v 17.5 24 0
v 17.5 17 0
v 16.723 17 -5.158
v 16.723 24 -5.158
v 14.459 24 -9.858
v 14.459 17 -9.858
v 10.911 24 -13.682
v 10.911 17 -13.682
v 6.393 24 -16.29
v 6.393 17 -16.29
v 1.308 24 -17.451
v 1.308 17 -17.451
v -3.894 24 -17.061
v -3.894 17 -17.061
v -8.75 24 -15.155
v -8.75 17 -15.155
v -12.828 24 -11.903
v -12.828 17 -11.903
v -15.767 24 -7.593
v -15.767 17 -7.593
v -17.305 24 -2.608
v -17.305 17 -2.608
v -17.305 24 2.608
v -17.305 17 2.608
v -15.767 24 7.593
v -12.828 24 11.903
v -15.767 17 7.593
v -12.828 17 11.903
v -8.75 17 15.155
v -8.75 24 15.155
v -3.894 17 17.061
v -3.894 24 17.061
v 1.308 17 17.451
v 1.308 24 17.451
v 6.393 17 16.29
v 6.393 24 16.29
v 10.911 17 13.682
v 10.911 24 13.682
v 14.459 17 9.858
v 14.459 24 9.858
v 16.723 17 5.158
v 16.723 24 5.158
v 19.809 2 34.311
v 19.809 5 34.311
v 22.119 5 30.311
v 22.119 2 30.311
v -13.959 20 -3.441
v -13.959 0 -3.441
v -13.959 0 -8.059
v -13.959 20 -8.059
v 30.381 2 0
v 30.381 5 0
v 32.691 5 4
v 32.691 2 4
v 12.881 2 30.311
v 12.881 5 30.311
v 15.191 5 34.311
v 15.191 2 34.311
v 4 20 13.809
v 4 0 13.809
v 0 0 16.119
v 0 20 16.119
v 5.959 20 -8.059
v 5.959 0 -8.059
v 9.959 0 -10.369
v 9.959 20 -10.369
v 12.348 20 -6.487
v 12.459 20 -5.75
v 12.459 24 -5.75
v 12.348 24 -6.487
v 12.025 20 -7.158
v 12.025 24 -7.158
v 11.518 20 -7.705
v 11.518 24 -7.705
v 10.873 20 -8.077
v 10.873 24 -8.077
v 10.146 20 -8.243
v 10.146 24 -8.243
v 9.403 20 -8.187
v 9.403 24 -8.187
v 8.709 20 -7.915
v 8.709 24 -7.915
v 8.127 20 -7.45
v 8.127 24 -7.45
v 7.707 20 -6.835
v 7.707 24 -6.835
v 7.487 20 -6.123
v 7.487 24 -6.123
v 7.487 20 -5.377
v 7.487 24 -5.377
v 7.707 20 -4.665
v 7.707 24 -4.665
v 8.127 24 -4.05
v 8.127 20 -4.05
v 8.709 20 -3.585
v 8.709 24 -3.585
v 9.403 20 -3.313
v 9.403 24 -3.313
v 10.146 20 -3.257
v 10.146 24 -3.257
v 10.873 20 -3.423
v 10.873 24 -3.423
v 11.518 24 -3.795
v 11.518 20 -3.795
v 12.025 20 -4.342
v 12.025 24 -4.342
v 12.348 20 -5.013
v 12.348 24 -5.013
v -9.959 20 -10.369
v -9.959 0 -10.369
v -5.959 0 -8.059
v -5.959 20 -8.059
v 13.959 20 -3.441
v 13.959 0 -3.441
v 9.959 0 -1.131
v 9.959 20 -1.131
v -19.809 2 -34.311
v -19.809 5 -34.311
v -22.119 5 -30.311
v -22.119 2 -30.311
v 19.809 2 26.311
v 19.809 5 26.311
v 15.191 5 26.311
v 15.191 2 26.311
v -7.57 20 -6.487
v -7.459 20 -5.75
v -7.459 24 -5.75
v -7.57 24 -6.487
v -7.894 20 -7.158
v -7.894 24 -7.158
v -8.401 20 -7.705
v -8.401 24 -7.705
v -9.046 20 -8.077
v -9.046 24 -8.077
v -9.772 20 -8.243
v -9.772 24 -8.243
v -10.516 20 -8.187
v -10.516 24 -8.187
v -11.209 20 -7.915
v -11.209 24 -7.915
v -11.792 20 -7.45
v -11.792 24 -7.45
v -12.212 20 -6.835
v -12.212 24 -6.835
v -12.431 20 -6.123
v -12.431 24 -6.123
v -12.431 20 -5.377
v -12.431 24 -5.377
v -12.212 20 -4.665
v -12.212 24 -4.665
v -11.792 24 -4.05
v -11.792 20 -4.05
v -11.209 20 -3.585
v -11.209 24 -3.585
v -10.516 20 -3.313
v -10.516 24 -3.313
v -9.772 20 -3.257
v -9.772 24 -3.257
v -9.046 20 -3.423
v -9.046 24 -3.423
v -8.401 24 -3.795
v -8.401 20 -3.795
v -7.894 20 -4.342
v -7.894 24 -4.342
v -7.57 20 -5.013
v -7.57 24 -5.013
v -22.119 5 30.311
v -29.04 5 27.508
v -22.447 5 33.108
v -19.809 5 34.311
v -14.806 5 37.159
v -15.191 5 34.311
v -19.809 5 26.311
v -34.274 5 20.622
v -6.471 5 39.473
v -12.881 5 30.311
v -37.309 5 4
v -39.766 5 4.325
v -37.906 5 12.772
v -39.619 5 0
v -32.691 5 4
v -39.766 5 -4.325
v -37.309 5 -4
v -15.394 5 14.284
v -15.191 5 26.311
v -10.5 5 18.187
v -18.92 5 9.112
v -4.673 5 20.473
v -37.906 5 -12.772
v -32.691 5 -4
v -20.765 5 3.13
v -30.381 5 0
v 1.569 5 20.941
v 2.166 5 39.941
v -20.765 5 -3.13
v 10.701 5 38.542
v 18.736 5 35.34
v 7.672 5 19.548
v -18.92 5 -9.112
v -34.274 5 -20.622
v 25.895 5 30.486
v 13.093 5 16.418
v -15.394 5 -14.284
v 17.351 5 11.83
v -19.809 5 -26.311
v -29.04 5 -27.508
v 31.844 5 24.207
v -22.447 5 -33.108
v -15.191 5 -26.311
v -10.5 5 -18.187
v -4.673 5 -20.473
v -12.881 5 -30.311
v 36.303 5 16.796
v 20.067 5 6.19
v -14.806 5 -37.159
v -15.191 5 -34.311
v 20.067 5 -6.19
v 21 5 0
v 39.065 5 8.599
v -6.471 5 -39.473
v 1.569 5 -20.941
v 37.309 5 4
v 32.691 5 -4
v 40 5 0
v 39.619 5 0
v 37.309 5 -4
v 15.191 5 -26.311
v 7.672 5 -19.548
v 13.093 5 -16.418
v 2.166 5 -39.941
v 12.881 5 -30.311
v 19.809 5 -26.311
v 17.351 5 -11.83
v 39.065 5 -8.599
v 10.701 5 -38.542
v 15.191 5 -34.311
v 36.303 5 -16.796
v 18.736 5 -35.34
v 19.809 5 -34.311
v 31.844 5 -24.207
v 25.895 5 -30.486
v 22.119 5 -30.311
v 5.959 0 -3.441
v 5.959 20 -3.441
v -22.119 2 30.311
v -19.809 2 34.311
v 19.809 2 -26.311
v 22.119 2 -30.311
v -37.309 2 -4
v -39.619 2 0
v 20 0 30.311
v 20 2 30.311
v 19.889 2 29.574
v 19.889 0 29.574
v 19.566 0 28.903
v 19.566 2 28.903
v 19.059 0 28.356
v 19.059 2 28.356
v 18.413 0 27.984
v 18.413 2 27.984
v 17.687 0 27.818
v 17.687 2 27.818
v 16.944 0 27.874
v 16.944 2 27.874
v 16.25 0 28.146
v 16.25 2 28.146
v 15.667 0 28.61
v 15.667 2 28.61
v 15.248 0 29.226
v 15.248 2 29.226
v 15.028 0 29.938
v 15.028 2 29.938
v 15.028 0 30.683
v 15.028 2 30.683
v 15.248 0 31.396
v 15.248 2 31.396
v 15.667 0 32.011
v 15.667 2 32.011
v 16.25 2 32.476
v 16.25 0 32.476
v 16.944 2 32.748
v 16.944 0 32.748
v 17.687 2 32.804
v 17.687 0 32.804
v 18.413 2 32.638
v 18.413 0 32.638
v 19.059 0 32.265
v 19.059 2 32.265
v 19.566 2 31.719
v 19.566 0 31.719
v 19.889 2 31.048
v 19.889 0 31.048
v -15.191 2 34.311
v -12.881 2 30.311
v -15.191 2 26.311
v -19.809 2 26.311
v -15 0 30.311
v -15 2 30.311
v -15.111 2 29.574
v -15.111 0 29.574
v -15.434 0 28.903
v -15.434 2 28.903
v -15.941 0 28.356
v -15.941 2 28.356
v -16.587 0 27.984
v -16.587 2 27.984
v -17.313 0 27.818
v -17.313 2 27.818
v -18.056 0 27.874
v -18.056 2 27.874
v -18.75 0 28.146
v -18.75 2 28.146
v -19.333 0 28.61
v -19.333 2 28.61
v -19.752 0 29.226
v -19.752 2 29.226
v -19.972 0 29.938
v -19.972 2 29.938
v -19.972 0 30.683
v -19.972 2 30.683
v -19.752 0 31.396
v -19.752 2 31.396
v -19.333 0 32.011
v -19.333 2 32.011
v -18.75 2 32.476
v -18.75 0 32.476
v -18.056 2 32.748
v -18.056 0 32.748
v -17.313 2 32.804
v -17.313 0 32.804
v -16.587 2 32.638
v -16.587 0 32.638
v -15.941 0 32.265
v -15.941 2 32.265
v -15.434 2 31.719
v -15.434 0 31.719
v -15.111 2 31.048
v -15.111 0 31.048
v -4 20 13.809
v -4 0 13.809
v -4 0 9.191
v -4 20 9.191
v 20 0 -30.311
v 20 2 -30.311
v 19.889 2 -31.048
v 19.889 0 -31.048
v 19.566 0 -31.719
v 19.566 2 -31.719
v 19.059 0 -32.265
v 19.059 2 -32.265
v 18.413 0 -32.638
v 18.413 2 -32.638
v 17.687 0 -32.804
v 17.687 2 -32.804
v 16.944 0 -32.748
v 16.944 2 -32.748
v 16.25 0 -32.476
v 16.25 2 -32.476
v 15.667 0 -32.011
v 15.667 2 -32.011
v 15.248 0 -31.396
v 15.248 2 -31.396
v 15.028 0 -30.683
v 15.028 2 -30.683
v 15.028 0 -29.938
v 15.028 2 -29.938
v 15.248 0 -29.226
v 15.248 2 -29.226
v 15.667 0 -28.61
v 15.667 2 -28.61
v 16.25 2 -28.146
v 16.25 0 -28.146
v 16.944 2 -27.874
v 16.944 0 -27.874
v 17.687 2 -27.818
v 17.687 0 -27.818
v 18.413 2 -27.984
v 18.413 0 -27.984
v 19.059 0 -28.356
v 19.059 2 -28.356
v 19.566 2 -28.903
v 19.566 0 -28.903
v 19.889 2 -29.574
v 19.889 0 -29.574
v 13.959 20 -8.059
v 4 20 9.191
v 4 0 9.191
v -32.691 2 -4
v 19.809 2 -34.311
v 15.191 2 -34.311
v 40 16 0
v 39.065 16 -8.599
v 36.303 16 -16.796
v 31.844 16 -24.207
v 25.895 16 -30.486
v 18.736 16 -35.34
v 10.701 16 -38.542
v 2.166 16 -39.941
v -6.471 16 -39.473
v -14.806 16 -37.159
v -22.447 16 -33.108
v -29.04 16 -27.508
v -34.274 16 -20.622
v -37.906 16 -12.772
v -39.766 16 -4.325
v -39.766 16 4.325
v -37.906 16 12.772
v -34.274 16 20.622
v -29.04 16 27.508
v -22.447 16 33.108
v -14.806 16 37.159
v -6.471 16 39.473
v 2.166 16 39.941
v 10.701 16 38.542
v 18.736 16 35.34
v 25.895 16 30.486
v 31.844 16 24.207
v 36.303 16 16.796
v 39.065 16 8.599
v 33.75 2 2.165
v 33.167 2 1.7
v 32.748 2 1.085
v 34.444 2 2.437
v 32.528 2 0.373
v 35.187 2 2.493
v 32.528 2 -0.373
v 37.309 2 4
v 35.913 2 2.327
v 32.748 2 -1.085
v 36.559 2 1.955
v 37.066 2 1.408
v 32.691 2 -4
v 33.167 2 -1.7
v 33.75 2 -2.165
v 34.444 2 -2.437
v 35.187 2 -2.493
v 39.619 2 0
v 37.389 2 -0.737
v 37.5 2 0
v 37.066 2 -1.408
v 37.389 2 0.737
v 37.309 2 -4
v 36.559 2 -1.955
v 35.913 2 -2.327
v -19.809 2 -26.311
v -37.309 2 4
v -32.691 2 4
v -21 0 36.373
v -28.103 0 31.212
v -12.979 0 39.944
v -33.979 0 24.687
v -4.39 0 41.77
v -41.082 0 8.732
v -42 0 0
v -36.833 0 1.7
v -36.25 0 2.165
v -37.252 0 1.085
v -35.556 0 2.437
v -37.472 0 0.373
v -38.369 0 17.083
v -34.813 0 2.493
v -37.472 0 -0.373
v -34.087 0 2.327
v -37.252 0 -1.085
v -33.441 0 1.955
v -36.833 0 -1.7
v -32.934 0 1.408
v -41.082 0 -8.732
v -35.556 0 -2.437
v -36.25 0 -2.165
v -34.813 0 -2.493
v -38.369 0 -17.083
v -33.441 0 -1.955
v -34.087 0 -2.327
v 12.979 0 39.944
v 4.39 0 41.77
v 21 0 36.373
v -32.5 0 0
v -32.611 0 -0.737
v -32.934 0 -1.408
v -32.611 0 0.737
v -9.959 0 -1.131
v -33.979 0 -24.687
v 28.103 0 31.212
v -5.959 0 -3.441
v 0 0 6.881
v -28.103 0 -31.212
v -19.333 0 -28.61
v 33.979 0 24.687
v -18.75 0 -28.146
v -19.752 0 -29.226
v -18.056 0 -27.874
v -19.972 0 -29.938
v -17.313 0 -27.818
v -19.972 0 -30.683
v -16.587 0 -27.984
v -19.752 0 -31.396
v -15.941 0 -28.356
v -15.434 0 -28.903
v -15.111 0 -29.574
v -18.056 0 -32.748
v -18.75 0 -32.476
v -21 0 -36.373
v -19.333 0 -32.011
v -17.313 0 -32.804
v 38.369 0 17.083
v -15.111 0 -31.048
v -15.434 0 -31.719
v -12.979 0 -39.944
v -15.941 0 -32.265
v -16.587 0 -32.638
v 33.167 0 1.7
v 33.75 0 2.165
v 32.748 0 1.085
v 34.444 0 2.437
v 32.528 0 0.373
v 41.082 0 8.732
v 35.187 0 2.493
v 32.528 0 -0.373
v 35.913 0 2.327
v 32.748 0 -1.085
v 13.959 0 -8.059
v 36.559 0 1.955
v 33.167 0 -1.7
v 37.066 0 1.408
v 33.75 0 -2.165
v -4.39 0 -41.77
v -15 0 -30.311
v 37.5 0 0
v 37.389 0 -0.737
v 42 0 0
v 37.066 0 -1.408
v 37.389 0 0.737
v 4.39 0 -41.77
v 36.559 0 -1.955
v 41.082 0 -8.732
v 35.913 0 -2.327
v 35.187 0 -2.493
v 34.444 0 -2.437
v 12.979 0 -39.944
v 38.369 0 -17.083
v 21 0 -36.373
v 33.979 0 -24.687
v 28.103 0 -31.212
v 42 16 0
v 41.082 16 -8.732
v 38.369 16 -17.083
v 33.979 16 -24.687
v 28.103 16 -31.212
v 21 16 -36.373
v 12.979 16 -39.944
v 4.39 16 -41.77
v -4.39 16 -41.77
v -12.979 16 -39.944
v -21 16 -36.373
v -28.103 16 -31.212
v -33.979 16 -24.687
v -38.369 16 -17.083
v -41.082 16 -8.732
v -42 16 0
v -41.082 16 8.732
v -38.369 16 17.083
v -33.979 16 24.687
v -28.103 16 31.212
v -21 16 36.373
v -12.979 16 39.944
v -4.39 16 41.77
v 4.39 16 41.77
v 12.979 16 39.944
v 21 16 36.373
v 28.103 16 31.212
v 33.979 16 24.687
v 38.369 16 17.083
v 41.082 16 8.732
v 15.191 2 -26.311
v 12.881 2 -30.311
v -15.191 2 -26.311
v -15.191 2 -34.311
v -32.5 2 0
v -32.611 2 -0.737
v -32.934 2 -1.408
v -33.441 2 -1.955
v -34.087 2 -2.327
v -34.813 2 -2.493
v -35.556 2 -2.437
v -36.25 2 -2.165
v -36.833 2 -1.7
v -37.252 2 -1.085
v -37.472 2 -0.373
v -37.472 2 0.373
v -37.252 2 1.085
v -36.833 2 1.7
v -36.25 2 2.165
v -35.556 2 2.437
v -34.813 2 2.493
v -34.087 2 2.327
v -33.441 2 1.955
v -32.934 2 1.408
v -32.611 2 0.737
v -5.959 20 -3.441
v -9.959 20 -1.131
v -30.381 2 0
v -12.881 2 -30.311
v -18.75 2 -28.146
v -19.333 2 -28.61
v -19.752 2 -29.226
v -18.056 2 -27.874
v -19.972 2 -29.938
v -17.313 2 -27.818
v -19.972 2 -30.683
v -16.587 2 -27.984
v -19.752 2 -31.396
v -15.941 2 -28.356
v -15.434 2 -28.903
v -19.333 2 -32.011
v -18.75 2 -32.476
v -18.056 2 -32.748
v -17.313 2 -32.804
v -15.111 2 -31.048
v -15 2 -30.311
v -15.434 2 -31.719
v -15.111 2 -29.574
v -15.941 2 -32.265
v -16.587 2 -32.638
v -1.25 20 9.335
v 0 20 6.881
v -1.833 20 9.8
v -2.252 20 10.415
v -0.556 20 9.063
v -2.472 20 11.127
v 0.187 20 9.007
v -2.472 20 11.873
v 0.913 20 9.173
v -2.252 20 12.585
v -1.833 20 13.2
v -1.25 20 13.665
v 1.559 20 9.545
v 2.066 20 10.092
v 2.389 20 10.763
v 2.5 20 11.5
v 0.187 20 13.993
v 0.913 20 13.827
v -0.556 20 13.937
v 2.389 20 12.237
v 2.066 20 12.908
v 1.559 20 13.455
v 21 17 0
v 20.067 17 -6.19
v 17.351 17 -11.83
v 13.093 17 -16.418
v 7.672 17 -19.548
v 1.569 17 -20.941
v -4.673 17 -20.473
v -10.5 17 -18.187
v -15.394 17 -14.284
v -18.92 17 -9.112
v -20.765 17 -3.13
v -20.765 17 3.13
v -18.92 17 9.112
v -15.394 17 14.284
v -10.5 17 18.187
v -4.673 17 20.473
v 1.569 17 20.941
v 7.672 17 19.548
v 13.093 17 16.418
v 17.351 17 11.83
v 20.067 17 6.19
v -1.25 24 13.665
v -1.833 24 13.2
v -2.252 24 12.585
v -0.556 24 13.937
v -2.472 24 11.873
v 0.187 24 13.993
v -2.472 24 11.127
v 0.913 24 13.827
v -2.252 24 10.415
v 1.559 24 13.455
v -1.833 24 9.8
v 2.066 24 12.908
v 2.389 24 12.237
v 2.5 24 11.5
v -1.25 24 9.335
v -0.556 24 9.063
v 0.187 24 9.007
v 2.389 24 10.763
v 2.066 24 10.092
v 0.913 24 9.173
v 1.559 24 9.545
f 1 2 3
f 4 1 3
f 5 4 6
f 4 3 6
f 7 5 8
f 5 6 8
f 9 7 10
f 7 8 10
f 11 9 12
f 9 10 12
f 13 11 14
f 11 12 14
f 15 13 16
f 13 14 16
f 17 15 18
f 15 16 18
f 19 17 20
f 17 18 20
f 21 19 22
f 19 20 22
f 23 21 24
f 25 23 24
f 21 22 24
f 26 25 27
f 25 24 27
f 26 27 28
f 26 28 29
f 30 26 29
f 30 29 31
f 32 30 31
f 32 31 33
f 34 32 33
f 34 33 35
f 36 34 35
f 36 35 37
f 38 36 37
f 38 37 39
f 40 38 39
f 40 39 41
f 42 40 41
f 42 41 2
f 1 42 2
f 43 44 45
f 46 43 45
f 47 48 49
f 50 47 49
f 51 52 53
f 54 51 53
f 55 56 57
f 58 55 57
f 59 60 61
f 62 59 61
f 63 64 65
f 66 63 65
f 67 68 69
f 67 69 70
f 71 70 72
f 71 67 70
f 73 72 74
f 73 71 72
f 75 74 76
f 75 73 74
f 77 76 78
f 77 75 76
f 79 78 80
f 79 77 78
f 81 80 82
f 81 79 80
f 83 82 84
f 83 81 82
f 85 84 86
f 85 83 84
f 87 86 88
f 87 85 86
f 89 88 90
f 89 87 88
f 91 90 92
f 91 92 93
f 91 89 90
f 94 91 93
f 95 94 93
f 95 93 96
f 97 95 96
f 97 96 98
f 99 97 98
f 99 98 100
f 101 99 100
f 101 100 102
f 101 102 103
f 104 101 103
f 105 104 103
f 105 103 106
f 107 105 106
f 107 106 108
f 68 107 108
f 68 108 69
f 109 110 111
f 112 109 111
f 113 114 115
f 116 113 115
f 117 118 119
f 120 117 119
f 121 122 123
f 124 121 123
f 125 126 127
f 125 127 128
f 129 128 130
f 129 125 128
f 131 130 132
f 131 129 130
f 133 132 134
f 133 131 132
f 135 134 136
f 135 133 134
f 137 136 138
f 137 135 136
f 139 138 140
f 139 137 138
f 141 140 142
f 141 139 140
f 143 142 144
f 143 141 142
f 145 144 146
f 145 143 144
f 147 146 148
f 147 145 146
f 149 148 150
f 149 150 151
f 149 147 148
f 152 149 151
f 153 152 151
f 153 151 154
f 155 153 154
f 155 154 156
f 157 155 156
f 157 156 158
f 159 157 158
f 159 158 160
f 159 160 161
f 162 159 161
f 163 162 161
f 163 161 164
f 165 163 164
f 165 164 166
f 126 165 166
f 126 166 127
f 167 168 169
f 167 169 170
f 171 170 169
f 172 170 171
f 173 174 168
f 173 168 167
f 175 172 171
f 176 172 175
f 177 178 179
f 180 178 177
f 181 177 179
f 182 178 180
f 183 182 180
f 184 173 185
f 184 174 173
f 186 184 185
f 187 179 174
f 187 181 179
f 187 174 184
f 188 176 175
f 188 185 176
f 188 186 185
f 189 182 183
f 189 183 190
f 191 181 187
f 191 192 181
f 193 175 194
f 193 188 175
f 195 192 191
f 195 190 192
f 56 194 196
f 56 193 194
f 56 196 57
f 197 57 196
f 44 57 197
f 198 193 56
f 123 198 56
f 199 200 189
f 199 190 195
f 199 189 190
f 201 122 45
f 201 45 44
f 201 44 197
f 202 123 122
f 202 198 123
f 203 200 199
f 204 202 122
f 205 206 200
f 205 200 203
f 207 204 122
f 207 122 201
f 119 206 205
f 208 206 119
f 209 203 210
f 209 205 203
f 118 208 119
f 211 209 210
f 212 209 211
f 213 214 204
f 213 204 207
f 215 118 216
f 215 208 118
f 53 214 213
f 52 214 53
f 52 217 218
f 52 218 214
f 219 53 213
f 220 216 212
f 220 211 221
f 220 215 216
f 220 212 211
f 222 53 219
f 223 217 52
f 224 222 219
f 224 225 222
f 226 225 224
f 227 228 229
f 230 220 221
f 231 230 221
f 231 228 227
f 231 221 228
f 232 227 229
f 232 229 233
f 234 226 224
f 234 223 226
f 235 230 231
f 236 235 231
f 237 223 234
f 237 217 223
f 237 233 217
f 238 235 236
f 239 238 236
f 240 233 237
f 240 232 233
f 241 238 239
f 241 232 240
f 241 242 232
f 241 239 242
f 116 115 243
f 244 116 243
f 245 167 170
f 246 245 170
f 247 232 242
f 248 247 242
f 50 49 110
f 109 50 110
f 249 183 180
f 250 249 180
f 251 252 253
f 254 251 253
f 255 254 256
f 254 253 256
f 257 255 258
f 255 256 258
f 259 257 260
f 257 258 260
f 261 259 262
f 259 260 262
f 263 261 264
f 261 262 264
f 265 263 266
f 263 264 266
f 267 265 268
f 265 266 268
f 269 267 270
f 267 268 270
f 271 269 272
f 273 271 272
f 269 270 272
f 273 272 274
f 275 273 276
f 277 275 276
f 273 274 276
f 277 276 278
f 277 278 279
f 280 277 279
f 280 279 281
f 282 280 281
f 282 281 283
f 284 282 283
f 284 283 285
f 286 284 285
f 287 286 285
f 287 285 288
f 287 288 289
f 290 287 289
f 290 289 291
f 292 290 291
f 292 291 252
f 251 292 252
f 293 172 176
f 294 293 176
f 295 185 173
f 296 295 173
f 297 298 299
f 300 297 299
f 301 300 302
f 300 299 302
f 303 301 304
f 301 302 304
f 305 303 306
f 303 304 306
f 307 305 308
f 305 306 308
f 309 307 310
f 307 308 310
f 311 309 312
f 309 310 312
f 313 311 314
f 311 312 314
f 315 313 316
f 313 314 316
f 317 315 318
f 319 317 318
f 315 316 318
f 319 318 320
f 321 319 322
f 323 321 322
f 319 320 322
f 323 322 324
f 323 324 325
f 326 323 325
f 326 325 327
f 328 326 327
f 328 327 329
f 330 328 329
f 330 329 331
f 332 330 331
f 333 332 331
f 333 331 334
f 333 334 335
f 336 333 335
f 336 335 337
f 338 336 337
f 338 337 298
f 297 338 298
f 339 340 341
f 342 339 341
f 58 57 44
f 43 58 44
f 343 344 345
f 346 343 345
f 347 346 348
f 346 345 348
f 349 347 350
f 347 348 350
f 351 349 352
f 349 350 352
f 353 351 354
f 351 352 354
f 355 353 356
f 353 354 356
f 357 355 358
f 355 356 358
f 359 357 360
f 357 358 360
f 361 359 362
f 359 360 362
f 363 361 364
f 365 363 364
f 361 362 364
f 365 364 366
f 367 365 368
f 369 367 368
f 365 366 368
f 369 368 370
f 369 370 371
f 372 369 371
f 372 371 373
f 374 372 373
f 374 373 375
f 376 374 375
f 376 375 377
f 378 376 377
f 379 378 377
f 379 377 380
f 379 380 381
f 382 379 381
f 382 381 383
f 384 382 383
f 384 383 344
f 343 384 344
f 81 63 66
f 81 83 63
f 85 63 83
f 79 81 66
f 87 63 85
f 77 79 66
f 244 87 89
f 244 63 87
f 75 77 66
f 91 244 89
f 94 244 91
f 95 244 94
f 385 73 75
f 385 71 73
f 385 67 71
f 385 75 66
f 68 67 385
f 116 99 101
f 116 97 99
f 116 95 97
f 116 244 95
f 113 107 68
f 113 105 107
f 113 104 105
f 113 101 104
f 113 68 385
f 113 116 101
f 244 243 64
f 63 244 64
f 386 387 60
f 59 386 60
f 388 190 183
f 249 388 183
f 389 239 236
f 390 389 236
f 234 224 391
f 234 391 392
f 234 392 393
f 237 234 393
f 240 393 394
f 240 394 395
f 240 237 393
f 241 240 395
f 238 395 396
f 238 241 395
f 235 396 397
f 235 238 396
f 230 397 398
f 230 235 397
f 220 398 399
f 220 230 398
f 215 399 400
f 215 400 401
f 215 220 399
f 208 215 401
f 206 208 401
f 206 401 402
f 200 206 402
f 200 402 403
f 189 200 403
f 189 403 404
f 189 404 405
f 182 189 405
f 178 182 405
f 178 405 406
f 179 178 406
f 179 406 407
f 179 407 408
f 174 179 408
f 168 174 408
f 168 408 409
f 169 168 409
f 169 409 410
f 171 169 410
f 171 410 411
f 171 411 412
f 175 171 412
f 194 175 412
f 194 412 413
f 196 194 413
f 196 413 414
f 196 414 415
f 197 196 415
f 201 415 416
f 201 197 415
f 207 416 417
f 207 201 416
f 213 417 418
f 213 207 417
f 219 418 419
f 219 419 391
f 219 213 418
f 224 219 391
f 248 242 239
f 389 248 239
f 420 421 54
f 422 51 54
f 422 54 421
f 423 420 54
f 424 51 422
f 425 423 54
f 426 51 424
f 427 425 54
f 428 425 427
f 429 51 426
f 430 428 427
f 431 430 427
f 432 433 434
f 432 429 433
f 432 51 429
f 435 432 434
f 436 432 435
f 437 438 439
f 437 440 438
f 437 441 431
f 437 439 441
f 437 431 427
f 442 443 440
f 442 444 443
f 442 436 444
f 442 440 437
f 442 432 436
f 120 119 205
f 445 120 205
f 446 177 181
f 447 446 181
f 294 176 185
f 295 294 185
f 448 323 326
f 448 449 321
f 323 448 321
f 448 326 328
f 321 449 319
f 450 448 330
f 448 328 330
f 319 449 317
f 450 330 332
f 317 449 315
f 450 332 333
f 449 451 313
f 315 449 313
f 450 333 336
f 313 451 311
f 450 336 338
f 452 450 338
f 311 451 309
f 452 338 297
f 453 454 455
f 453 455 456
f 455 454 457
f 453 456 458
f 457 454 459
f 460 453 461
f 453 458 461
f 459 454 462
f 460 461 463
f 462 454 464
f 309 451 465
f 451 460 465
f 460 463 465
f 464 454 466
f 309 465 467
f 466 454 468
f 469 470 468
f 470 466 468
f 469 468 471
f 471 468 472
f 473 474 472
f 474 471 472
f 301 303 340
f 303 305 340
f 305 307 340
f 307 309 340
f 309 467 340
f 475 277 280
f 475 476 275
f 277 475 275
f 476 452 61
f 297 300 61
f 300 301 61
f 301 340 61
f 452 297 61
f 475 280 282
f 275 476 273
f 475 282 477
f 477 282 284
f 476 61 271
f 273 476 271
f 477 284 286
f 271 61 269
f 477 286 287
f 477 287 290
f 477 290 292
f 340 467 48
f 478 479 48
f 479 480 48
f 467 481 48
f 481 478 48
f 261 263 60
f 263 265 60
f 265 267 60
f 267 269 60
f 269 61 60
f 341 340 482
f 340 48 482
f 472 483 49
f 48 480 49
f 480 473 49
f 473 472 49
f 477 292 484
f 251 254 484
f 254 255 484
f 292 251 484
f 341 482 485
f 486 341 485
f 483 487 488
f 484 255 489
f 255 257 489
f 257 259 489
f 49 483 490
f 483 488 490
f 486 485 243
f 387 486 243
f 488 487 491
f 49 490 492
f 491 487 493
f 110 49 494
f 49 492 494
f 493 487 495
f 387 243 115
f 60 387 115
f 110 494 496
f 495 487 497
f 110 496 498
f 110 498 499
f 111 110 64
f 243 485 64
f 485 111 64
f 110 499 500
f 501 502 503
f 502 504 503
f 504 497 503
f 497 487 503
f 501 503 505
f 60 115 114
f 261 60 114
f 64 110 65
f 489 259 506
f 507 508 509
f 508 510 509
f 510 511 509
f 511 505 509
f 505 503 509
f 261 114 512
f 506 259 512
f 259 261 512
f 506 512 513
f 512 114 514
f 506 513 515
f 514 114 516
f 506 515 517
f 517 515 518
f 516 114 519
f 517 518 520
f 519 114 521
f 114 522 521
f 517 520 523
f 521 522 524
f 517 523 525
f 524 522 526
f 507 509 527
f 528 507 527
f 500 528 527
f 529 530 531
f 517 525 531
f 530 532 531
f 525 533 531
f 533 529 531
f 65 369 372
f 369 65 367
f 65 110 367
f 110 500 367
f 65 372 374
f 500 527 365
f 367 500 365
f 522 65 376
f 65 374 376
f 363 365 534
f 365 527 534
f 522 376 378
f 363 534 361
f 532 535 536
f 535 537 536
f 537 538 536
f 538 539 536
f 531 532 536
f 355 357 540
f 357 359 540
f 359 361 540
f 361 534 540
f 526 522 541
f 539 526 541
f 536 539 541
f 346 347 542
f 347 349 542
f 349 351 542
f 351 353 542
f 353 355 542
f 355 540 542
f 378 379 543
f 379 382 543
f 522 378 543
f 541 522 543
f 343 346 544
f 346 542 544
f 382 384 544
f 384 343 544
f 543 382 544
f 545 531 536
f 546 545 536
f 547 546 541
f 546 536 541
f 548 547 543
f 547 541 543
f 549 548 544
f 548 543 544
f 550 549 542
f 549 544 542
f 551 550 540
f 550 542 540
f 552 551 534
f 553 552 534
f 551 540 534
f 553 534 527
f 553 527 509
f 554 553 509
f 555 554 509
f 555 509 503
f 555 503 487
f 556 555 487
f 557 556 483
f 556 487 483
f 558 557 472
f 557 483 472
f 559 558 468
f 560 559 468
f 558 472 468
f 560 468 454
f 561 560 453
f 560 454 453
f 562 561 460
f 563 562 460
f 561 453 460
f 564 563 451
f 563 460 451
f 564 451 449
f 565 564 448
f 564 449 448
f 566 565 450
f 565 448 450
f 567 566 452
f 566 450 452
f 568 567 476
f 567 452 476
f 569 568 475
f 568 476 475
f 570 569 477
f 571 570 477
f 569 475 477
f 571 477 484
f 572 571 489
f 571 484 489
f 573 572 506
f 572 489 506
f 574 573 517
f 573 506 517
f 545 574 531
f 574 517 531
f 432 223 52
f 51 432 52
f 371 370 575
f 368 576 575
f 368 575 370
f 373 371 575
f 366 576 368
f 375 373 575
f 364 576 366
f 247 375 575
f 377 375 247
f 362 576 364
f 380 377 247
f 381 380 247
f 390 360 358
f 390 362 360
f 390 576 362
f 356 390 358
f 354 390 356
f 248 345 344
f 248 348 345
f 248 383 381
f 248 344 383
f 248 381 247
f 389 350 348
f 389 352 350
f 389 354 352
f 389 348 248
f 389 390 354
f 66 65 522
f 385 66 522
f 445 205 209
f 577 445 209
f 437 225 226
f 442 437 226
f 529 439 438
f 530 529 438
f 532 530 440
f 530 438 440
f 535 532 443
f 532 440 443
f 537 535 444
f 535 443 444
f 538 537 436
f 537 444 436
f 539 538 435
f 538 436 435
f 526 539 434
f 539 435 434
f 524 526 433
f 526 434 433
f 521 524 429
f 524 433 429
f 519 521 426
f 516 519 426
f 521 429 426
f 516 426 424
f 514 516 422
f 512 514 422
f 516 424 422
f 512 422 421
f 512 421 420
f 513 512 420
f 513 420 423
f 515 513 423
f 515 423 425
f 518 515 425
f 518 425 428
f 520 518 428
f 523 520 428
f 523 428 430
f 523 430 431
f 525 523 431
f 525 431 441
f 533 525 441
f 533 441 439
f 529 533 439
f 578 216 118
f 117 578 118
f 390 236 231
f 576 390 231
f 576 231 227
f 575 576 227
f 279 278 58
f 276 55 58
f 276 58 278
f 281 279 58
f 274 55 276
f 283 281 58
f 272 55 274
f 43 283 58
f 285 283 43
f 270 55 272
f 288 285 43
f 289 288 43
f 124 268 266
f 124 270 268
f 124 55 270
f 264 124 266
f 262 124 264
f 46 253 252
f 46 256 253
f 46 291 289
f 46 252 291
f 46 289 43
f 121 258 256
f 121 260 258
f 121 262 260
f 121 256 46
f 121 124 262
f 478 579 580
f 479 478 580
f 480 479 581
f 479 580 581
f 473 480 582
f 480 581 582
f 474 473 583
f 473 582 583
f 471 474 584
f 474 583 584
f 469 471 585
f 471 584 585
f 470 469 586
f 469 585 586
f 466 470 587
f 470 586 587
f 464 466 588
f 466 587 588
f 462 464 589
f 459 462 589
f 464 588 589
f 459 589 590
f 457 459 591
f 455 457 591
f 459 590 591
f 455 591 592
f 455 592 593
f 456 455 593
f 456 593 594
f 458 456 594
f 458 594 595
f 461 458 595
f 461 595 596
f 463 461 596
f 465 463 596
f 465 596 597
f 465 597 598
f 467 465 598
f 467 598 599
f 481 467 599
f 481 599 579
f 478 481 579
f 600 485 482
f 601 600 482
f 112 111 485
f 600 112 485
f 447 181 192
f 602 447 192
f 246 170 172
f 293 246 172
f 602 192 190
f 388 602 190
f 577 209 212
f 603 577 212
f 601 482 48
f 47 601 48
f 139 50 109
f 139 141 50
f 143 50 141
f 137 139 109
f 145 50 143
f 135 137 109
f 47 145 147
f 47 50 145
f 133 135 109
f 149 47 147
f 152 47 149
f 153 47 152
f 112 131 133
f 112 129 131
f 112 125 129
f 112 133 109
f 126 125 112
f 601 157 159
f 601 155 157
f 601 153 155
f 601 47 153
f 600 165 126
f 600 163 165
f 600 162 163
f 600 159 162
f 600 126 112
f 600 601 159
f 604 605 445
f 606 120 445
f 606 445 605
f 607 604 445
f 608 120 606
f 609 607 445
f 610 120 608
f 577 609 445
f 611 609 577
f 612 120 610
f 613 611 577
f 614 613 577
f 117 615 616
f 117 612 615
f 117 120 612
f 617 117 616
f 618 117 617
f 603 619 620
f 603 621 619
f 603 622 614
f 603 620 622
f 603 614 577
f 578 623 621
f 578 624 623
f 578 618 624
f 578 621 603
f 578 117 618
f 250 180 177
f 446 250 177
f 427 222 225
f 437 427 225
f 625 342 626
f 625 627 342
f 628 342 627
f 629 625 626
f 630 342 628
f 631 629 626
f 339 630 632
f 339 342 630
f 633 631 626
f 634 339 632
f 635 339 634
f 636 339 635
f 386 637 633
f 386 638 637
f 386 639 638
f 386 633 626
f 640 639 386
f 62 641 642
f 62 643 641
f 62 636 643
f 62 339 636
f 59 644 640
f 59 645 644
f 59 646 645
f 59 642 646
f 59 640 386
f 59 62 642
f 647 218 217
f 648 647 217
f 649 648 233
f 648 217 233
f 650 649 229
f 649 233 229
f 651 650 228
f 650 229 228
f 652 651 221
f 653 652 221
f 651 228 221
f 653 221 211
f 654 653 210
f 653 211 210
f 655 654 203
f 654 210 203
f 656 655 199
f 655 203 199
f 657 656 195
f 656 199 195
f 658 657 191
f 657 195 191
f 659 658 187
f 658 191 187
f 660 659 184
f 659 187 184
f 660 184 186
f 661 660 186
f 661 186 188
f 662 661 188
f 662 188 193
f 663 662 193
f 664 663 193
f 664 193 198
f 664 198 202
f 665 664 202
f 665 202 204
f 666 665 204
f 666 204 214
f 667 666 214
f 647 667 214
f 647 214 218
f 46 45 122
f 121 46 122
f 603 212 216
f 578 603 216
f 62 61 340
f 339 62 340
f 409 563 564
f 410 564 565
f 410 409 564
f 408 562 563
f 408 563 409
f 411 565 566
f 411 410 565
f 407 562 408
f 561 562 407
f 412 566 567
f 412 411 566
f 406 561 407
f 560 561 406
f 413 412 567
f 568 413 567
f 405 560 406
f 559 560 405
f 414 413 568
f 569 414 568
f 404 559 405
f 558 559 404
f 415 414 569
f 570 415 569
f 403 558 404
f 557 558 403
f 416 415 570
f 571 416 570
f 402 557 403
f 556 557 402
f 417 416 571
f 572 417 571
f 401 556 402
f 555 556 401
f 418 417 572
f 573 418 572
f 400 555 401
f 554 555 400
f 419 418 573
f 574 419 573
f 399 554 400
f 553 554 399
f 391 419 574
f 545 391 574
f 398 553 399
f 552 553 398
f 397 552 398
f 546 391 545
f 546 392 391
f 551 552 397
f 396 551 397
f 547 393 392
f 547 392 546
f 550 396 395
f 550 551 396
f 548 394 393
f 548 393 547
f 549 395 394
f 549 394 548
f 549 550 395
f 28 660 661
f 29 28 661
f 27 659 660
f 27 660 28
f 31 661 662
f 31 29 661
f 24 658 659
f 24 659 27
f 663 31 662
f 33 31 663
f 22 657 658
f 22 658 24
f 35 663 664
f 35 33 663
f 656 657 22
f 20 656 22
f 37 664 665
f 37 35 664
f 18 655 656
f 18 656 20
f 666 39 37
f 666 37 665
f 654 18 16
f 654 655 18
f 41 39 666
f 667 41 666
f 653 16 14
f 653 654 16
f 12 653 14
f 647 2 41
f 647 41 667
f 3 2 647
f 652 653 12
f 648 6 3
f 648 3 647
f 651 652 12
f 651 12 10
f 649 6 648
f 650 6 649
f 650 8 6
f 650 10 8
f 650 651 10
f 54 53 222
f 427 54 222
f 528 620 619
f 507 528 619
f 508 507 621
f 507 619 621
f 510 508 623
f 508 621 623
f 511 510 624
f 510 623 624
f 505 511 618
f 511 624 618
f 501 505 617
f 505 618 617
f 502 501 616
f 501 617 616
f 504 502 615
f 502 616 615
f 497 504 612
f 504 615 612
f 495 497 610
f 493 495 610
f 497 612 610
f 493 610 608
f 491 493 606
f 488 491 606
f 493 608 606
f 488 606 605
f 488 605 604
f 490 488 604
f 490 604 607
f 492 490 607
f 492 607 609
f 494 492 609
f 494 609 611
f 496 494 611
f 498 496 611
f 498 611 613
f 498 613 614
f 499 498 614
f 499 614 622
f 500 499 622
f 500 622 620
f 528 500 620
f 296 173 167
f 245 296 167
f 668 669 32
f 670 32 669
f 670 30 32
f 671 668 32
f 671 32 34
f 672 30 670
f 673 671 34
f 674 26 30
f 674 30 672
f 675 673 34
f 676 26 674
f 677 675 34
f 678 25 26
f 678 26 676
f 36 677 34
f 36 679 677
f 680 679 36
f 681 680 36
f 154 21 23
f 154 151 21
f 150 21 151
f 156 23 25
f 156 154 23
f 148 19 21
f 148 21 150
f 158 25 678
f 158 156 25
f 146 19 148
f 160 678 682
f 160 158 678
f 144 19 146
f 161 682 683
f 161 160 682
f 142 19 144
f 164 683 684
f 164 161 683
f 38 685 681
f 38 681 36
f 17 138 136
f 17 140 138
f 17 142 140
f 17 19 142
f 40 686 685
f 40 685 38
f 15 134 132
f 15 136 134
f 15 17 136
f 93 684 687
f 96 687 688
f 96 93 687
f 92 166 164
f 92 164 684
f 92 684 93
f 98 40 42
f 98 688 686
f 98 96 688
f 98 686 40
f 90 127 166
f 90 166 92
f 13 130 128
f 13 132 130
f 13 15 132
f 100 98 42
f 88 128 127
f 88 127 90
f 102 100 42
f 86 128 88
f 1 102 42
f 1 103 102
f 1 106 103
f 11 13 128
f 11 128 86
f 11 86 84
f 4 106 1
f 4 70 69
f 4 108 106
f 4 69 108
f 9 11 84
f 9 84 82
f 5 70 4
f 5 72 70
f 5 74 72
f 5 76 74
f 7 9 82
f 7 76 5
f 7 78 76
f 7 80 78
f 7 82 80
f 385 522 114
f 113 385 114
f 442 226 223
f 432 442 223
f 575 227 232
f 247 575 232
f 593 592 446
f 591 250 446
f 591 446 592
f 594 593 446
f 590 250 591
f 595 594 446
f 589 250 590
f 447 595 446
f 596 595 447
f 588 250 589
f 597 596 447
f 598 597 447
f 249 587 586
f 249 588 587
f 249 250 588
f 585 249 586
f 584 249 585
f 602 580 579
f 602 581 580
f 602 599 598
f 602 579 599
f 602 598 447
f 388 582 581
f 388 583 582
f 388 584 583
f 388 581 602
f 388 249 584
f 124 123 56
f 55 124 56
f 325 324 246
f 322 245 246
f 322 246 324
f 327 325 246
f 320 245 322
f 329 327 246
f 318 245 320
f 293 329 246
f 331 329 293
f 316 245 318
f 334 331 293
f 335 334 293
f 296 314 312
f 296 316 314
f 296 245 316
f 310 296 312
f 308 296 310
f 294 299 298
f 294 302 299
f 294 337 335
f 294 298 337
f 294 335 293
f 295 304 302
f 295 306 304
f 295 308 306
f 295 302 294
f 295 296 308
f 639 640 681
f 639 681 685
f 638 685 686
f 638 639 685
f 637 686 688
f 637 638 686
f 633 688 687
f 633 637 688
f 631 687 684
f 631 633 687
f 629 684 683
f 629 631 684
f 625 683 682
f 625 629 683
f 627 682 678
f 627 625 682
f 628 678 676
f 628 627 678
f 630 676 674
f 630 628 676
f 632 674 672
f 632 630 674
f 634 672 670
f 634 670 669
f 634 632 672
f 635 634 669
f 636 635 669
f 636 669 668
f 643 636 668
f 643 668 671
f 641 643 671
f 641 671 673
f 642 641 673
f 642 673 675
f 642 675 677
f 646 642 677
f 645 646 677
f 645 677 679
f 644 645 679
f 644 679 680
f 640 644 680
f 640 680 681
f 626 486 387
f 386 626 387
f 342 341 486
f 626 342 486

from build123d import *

# Parameters (mm, degrees)
SKETCH1_R           = 17.5
SKETCH1_R_2         = 2.5
BOSS_EXTRUDE1_DEPTH = 24
SKETCH1_3_R         = 21
SKETCH1_3_R_2       = 17.5
BOSS_EXTRUDE2_DEPTH = 17
SKETCH1_6_R         = 40
SKETCH1_6_R_2       = 21
BOSS_EXTRUDE4_DEPTH = 5
SKETCH1_7_R         = 42
SKETCH1_7_R_2       = 40
BOSS_EXTRUDE5_DEPTH = 16
SKETCH2_R           = 2.5
CUT_EXTRUDE1_DEPTH  = 6
CUT_EXTRUDE2_DEPTH  = 3
CUT_EXTRUDE3_DEPTH  = 20


with BuildPart() as part:
    # Sketch1 → Boss-Extrude1 (new body)
    with BuildSketch(Plane(origin=(0, 0, 0), x_dir=(1, 0, 0), z_dir=(0, 1, 0))):
        Circle(SKETCH1_R)
        with Locations((-9.959292144, 5.75)):
            Circle(SKETCH1_R_2, mode=Mode.SUBTRACT)
        with Locations((9.959292144, 5.75)):
            Circle(SKETCH1_R_2, mode=Mode.SUBTRACT)
        with Locations((0, -11.5)):
            Circle(SKETCH1_R_2, mode=Mode.SUBTRACT)
    extrude(amount=BOSS_EXTRUDE1_DEPTH)

    # Sketch1<3> → Boss-Extrude2 (add)
    with BuildSketch(Plane(origin=(0, 0, 0), x_dir=(1, 0, 0), z_dir=(0, 1, 0))):
        Circle(SKETCH1_3_R)
        Circle(SKETCH1_3_R_2, mode=Mode.SUBTRACT)
    extrude(amount=BOSS_EXTRUDE2_DEPTH)

    # Sketch1<6> → Boss-Extrude4 (add)
    with BuildSketch(Plane(origin=(0, 0, 0), x_dir=(1, 0, 0), z_dir=(0, 1, 0))):
        Circle(SKETCH1_6_R)
        Circle(SKETCH1_6_R_2, mode=Mode.SUBTRACT)
    extrude(amount=BOSS_EXTRUDE4_DEPTH)

    # Sketch1<7> → Boss-Extrude5 (add)
    with BuildSketch(Plane(origin=(0, 0, 0), x_dir=(1, 0, 0), z_dir=(0, 1, 0))):
        Circle(SKETCH1_7_R)
        Circle(SKETCH1_7_R_2, mode=Mode.SUBTRACT)
    extrude(amount=BOSS_EXTRUDE5_DEPTH)

    # Sketch2 → Cut-Extrude1 (cut, through all)
    with BuildSketch(Plane(origin=(0, 5, 0), x_dir=(1, 0, 0), z_dir=(0, 1, 0))):
        with Locations((-35, 0)):
            Circle(SKETCH2_R)
        with Locations((-17.5, 30.310889132)):
            Circle(SKETCH2_R)
        with Locations((17.5, 30.310889132)):
            Circle(SKETCH2_R)
        with Locations((35, 0)):
            Circle(SKETCH2_R)
        with Locations((17.5, -30.310889132)):
            Circle(SKETCH2_R)
        with Locations((-17.5, -30.310889132)):
            Circle(SKETCH2_R)
    extrude(amount=-CUT_EXTRUDE1_DEPTH, mode=Mode.SUBTRACT)

    # Sketch3 → Cut-Extrude2 (cut)
    with BuildSketch(Plane(origin=(0, 5, 0), x_dir=(1, 0, 0), z_dir=(0, 1, 0))):
        Polygon((-12.881197846, 30.310889132), (-15.190598923, 34.310889132), (-19.809401077, 34.310889132), (-22.118802154, 30.310889132), (-19.809401077, 26.310889132), (-15.190598923, 26.310889132), align=None)
        Polygon((19.809401077, 26.310889132), (22.118802154, 30.310889132), (19.809401077, 34.310889132), (15.190598923, 34.310889132), (12.881197846, 30.310889132), (15.190598923, 26.310889132), align=None)
        Polygon((32.690598923, -4), (37.309401077, -4), (39.618802154, 0), (37.309401077, 4), (32.690598923, 4), (30.381197846, 0), align=None)
        Polygon((12.881197846, -30.310889132), (15.190598923, -34.310889132), (19.809401077, -34.310889132), (22.118802154, -30.310889132), (19.809401077, -26.310889132), (15.190598923, -26.310889132), align=None)
        Polygon((-19.809401077, -26.310889132), (-22.118802154, -30.310889132), (-19.809401077, -34.310889132), (-15.190598923, -34.310889132), (-12.881197846, -30.310889132), (-15.190598923, -26.310889132), align=None)
        Polygon((-32.690598923, 4), (-37.309401077, 4), (-39.618802154, 0), (-37.309401077, -4), (-32.690598923, -4), (-30.381197846, 0), align=None)
    extrude(amount=-CUT_EXTRUDE2_DEPTH, mode=Mode.SUBTRACT)

    # Sketch4 → Cut-Extrude3 (cut)
    with BuildSketch(Plane.XZ):
        Polygon((0, 6.881197846), (4, 9.190598923), (4, 13.809401077), (0, 16.118802154), (-4, 13.809401077), (-4, 9.190598923), align=None)
        Polygon((5.959292144, -3.440598923), (5.959292144, -8.059401077), (9.959292144, -10.368802154), (13.959292144, -8.059401077), (13.959292144, -3.440598923), (9.959292144, -1.131197846), align=None)
        Polygon((-5.959292144, -3.440598923), (-9.959292144, -1.131197846), (-13.959292144, -3.440598923), (-13.959292144, -8.059401077), (-9.959292144, -10.368802154), (-5.959292144, -8.059401077), align=None)
    extrude(amount=-CUT_EXTRUDE3_DEPTH, mode=Mode.SUBTRACT)


solid = part.part
